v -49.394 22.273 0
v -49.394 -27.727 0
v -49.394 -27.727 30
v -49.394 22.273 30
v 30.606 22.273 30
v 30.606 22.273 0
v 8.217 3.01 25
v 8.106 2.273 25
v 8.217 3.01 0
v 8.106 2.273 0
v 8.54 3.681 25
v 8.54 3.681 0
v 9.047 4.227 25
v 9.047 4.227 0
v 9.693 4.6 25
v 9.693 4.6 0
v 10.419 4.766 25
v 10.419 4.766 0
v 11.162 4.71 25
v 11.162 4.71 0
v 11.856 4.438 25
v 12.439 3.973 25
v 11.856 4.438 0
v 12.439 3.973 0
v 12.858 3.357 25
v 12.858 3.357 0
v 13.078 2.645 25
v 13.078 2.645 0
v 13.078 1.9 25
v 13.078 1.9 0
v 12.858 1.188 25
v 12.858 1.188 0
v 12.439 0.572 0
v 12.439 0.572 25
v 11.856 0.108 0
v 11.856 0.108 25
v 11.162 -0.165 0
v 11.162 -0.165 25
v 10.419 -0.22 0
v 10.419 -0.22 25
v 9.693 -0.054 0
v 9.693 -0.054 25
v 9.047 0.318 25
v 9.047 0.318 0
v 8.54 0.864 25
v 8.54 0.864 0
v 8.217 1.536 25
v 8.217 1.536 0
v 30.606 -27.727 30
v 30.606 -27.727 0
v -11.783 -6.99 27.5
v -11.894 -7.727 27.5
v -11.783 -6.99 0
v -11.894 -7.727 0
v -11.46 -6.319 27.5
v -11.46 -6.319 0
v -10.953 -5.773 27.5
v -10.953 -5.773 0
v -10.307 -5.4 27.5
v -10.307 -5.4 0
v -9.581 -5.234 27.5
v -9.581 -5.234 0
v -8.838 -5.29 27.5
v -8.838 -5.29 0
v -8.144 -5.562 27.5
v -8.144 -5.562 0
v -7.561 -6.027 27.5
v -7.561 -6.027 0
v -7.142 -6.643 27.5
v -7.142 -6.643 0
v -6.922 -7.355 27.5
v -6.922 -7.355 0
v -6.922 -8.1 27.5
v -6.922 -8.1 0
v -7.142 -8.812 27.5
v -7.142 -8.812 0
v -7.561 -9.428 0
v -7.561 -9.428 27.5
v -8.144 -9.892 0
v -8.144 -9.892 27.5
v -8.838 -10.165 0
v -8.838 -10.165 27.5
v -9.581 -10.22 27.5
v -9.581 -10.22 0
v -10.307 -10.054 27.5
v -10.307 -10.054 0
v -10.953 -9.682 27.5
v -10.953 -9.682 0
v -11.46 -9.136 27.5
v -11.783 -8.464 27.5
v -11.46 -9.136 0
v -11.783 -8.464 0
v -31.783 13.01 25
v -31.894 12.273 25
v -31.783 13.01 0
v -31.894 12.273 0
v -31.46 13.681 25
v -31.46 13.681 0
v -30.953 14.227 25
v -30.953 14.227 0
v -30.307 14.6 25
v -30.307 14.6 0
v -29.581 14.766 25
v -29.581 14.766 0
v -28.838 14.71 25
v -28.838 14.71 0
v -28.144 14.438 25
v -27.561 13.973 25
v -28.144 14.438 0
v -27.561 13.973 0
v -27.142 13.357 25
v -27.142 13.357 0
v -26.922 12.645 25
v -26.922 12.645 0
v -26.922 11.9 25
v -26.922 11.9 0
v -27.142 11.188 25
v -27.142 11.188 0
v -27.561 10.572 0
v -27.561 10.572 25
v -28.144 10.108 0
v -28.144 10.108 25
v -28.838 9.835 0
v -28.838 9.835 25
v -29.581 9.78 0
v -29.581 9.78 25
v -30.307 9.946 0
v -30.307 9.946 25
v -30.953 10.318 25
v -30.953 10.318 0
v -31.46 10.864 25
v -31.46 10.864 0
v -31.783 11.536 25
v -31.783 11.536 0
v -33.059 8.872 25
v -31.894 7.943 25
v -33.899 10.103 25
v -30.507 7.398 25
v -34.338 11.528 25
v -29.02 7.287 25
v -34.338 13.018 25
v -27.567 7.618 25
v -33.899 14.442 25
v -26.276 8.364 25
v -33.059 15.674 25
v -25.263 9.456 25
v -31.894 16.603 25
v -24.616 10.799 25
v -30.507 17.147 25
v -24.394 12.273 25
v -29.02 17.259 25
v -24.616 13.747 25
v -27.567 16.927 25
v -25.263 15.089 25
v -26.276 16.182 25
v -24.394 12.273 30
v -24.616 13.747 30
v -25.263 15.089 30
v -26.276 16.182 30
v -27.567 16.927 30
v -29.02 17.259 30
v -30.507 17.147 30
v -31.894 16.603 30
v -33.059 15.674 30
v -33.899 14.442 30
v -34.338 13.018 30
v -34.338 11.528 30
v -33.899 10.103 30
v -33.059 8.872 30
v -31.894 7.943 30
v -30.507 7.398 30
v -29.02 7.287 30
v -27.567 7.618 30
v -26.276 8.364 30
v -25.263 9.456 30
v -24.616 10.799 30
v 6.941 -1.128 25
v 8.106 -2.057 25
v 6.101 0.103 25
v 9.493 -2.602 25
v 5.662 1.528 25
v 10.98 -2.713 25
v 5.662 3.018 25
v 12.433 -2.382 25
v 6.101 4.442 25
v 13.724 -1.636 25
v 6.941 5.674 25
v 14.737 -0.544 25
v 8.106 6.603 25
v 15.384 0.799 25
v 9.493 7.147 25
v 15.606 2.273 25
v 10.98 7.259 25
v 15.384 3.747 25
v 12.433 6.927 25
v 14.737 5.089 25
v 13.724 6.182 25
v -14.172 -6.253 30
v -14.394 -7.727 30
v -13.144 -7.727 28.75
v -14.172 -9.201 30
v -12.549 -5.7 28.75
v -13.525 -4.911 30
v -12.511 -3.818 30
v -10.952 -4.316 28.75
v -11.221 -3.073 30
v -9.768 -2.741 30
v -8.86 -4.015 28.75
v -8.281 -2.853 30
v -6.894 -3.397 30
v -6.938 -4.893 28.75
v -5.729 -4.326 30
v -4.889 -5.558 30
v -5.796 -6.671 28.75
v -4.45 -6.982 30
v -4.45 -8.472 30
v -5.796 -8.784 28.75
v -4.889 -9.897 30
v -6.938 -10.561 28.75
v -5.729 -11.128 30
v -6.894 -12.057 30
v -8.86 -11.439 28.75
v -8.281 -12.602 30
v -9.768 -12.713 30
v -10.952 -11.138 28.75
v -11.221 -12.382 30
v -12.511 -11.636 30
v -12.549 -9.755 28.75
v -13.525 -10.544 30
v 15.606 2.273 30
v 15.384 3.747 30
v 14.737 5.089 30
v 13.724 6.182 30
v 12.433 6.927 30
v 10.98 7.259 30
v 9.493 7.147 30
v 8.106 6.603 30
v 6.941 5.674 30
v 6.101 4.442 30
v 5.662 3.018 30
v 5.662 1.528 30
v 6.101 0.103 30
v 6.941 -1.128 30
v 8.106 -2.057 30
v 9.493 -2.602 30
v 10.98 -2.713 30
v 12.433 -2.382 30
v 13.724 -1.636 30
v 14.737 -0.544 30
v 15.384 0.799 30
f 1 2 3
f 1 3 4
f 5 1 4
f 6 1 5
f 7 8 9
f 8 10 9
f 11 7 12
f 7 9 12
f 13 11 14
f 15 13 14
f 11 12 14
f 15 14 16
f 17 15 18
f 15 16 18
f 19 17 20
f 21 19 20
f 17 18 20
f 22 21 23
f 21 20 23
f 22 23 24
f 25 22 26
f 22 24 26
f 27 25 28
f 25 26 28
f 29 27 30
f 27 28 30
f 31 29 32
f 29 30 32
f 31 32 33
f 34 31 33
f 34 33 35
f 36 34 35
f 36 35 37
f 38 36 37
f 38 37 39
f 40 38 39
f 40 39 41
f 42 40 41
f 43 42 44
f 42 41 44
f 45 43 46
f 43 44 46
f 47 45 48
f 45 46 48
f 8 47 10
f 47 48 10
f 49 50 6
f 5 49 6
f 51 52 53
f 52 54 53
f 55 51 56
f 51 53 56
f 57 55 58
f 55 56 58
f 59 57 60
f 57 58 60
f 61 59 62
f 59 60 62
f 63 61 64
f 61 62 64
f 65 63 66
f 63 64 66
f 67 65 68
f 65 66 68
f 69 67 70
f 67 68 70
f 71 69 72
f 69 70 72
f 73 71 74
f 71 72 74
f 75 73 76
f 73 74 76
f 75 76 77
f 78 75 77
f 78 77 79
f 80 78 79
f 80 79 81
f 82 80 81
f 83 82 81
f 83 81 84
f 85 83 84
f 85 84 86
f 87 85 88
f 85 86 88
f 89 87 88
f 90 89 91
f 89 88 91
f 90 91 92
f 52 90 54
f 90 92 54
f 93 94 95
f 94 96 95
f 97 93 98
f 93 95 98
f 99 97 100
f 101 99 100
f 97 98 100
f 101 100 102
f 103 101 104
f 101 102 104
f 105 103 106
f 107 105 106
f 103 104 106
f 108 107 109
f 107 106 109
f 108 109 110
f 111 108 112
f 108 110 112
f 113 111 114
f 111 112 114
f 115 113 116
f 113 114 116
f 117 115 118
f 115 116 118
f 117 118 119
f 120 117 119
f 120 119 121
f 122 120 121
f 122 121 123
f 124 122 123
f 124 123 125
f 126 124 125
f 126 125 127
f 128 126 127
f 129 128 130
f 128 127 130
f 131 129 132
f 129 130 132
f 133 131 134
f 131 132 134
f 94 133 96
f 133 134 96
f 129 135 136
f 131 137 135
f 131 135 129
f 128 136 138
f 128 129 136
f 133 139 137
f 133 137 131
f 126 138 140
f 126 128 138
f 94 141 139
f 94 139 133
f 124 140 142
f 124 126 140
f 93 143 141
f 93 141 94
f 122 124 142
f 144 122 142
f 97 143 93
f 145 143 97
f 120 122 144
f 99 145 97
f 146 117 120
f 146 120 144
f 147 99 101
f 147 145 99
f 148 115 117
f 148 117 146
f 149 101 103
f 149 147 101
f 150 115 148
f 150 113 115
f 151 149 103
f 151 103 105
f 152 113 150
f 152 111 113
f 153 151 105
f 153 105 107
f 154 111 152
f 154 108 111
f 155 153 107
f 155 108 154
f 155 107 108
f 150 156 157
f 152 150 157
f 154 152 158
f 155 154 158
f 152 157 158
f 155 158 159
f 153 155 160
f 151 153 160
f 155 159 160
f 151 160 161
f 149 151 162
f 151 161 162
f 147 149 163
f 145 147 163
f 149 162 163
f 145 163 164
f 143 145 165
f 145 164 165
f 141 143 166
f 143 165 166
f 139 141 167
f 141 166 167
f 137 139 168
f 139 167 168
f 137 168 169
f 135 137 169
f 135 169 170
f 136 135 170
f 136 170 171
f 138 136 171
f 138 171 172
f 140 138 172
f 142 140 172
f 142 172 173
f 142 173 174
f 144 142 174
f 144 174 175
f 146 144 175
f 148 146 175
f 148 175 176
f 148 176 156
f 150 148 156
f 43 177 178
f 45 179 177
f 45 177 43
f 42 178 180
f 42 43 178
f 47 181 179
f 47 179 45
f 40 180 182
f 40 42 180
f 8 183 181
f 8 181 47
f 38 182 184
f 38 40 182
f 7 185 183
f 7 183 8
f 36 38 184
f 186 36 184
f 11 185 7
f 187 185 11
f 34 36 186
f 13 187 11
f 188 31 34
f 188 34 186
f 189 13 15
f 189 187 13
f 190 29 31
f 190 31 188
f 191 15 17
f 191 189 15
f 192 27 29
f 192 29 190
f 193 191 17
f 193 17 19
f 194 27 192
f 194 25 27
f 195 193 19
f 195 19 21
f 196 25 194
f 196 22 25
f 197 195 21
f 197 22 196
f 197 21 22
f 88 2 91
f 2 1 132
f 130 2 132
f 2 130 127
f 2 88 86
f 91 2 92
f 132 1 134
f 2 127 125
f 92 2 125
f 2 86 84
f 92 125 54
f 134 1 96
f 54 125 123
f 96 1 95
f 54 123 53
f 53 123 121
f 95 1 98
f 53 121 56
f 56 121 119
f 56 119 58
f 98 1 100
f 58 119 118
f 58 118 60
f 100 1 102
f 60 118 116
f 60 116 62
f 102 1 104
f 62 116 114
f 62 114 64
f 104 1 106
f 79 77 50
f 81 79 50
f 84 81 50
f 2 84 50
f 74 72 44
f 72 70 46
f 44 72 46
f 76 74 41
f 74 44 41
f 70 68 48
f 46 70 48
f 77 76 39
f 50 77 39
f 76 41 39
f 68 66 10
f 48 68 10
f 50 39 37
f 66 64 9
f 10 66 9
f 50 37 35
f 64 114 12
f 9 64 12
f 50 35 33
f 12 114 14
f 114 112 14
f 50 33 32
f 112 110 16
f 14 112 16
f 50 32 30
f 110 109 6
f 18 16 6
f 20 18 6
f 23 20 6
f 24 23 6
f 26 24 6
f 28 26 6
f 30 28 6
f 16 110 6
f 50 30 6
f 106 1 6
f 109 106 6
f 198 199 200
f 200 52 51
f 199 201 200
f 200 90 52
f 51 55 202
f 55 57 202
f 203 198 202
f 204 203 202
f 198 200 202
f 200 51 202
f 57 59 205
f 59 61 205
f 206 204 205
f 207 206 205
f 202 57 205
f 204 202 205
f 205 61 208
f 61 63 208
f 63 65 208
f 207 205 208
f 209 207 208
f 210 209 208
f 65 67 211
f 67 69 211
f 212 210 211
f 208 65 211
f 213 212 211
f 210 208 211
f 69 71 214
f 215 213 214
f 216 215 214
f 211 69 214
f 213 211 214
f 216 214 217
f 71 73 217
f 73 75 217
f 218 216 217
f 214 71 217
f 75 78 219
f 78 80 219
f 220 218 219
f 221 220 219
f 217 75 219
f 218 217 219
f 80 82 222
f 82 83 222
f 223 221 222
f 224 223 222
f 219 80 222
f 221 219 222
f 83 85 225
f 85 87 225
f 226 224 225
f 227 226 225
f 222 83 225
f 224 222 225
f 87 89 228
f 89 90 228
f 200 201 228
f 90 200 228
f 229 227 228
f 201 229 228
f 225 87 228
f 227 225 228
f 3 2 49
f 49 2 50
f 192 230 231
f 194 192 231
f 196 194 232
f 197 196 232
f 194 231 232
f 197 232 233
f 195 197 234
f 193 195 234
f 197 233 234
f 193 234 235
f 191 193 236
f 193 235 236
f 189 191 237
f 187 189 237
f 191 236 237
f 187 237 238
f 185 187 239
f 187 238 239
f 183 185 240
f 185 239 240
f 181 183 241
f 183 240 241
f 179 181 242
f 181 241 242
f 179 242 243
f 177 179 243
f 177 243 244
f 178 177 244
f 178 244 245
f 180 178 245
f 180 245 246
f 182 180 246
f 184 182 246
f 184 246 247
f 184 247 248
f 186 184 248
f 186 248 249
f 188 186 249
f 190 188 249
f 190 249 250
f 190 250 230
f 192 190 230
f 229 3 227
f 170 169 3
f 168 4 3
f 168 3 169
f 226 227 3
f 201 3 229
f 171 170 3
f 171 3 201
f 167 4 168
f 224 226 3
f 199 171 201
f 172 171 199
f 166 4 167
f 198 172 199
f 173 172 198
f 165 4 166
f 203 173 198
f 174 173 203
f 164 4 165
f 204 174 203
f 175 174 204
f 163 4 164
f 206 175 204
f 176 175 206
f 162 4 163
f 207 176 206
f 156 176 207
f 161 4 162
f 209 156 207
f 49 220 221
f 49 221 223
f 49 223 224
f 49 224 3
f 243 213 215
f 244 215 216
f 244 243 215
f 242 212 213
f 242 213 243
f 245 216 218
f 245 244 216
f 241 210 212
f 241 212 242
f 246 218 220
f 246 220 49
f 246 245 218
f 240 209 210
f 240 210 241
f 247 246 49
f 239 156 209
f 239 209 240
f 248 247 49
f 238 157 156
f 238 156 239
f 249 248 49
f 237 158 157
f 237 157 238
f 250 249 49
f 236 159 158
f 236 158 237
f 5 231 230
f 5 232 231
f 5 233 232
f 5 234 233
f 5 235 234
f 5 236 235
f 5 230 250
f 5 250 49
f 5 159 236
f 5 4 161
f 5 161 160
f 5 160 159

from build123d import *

# Parameters (mm, degrees)
SKETCH1_W                                        = 80
SKETCH1_H                                        = 50
BOSS_EXTRUDE1_DEPTH                              = 30
CBORE_FOR_M10_HEX_HEAD_BOLT8_D                   = 5
CBORE_FOR_M10_HEX_HEAD_BOLT8_CBORE_D             = 10
CBORE_FOR_M10_HEX_HEAD_BOLT8_CBORE_DEPTH         = 5
CBORE_FOR_M10_HEX_HEAD_BOLT9_D                   = 5
CBORE_FOR_M10_HEX_HEAD_BOLT9_CBORE_D             = 10
CBORE_FOR_M10_HEX_HEAD_BOLT9_CBORE_DEPTH         = 5
CSK_FOR_M10_FLAT_HEAD_MACHINE_SCREW1_D           = 5
CSK_FOR_M10_FLAT_HEAD_MACHINE_SCREW1_CSINK_D     = 10
CSK_FOR_M10_FLAT_HEAD_MACHINE_SCREW1_CSINK_ANGLE = 90


with BuildPart() as part:
    # Sketch1 → Boss-Extrude1 (new body)
    with BuildSketch(Plane.XY):
        with Locations((-9.393939394, -2.727272727)):
            Rectangle(SKETCH1_W, SKETCH1_H)
    extrude(amount=BOSS_EXTRUDE1_DEPTH)

    # CBORE for M10 Hex Head Bolt8 (through all)
    with Locations(Plane.XY.offset(30)):
        with Locations((-29.393939394, 12.272727273)):
            CounterBoreHole(CBORE_FOR_M10_HEX_HEAD_BOLT8_D / 2, CBORE_FOR_M10_HEX_HEAD_BOLT8_CBORE_D / 2, CBORE_FOR_M10_HEX_HEAD_BOLT8_CBORE_DEPTH)

    # CBORE for M10 Hex Head Bolt9 (through all)
    with Locations(Plane.XY.offset(30)):
        with Locations((10.606060606, 2.272727273)):
            CounterBoreHole(CBORE_FOR_M10_HEX_HEAD_BOLT9_D / 2, CBORE_FOR_M10_HEX_HEAD_BOLT9_CBORE_D / 2, CBORE_FOR_M10_HEX_HEAD_BOLT9_CBORE_DEPTH)

    # CSK for M10 Flat Head Machine Screw1 (through all)
    with Locations(Plane.XY.offset(30)):
        with Locations((-9.393939394, -7.727272727)):
            CounterSinkHole(CSK_FOR_M10_FLAT_HEAD_MACHINE_SCREW1_D / 2, CSK_FOR_M10_FLAT_HEAD_MACHINE_SCREW1_CSINK_D / 2, counter_sink_angle=CSK_FOR_M10_FLAT_HEAD_MACHINE_SCREW1_CSINK_ANGLE)


solid = part.part
